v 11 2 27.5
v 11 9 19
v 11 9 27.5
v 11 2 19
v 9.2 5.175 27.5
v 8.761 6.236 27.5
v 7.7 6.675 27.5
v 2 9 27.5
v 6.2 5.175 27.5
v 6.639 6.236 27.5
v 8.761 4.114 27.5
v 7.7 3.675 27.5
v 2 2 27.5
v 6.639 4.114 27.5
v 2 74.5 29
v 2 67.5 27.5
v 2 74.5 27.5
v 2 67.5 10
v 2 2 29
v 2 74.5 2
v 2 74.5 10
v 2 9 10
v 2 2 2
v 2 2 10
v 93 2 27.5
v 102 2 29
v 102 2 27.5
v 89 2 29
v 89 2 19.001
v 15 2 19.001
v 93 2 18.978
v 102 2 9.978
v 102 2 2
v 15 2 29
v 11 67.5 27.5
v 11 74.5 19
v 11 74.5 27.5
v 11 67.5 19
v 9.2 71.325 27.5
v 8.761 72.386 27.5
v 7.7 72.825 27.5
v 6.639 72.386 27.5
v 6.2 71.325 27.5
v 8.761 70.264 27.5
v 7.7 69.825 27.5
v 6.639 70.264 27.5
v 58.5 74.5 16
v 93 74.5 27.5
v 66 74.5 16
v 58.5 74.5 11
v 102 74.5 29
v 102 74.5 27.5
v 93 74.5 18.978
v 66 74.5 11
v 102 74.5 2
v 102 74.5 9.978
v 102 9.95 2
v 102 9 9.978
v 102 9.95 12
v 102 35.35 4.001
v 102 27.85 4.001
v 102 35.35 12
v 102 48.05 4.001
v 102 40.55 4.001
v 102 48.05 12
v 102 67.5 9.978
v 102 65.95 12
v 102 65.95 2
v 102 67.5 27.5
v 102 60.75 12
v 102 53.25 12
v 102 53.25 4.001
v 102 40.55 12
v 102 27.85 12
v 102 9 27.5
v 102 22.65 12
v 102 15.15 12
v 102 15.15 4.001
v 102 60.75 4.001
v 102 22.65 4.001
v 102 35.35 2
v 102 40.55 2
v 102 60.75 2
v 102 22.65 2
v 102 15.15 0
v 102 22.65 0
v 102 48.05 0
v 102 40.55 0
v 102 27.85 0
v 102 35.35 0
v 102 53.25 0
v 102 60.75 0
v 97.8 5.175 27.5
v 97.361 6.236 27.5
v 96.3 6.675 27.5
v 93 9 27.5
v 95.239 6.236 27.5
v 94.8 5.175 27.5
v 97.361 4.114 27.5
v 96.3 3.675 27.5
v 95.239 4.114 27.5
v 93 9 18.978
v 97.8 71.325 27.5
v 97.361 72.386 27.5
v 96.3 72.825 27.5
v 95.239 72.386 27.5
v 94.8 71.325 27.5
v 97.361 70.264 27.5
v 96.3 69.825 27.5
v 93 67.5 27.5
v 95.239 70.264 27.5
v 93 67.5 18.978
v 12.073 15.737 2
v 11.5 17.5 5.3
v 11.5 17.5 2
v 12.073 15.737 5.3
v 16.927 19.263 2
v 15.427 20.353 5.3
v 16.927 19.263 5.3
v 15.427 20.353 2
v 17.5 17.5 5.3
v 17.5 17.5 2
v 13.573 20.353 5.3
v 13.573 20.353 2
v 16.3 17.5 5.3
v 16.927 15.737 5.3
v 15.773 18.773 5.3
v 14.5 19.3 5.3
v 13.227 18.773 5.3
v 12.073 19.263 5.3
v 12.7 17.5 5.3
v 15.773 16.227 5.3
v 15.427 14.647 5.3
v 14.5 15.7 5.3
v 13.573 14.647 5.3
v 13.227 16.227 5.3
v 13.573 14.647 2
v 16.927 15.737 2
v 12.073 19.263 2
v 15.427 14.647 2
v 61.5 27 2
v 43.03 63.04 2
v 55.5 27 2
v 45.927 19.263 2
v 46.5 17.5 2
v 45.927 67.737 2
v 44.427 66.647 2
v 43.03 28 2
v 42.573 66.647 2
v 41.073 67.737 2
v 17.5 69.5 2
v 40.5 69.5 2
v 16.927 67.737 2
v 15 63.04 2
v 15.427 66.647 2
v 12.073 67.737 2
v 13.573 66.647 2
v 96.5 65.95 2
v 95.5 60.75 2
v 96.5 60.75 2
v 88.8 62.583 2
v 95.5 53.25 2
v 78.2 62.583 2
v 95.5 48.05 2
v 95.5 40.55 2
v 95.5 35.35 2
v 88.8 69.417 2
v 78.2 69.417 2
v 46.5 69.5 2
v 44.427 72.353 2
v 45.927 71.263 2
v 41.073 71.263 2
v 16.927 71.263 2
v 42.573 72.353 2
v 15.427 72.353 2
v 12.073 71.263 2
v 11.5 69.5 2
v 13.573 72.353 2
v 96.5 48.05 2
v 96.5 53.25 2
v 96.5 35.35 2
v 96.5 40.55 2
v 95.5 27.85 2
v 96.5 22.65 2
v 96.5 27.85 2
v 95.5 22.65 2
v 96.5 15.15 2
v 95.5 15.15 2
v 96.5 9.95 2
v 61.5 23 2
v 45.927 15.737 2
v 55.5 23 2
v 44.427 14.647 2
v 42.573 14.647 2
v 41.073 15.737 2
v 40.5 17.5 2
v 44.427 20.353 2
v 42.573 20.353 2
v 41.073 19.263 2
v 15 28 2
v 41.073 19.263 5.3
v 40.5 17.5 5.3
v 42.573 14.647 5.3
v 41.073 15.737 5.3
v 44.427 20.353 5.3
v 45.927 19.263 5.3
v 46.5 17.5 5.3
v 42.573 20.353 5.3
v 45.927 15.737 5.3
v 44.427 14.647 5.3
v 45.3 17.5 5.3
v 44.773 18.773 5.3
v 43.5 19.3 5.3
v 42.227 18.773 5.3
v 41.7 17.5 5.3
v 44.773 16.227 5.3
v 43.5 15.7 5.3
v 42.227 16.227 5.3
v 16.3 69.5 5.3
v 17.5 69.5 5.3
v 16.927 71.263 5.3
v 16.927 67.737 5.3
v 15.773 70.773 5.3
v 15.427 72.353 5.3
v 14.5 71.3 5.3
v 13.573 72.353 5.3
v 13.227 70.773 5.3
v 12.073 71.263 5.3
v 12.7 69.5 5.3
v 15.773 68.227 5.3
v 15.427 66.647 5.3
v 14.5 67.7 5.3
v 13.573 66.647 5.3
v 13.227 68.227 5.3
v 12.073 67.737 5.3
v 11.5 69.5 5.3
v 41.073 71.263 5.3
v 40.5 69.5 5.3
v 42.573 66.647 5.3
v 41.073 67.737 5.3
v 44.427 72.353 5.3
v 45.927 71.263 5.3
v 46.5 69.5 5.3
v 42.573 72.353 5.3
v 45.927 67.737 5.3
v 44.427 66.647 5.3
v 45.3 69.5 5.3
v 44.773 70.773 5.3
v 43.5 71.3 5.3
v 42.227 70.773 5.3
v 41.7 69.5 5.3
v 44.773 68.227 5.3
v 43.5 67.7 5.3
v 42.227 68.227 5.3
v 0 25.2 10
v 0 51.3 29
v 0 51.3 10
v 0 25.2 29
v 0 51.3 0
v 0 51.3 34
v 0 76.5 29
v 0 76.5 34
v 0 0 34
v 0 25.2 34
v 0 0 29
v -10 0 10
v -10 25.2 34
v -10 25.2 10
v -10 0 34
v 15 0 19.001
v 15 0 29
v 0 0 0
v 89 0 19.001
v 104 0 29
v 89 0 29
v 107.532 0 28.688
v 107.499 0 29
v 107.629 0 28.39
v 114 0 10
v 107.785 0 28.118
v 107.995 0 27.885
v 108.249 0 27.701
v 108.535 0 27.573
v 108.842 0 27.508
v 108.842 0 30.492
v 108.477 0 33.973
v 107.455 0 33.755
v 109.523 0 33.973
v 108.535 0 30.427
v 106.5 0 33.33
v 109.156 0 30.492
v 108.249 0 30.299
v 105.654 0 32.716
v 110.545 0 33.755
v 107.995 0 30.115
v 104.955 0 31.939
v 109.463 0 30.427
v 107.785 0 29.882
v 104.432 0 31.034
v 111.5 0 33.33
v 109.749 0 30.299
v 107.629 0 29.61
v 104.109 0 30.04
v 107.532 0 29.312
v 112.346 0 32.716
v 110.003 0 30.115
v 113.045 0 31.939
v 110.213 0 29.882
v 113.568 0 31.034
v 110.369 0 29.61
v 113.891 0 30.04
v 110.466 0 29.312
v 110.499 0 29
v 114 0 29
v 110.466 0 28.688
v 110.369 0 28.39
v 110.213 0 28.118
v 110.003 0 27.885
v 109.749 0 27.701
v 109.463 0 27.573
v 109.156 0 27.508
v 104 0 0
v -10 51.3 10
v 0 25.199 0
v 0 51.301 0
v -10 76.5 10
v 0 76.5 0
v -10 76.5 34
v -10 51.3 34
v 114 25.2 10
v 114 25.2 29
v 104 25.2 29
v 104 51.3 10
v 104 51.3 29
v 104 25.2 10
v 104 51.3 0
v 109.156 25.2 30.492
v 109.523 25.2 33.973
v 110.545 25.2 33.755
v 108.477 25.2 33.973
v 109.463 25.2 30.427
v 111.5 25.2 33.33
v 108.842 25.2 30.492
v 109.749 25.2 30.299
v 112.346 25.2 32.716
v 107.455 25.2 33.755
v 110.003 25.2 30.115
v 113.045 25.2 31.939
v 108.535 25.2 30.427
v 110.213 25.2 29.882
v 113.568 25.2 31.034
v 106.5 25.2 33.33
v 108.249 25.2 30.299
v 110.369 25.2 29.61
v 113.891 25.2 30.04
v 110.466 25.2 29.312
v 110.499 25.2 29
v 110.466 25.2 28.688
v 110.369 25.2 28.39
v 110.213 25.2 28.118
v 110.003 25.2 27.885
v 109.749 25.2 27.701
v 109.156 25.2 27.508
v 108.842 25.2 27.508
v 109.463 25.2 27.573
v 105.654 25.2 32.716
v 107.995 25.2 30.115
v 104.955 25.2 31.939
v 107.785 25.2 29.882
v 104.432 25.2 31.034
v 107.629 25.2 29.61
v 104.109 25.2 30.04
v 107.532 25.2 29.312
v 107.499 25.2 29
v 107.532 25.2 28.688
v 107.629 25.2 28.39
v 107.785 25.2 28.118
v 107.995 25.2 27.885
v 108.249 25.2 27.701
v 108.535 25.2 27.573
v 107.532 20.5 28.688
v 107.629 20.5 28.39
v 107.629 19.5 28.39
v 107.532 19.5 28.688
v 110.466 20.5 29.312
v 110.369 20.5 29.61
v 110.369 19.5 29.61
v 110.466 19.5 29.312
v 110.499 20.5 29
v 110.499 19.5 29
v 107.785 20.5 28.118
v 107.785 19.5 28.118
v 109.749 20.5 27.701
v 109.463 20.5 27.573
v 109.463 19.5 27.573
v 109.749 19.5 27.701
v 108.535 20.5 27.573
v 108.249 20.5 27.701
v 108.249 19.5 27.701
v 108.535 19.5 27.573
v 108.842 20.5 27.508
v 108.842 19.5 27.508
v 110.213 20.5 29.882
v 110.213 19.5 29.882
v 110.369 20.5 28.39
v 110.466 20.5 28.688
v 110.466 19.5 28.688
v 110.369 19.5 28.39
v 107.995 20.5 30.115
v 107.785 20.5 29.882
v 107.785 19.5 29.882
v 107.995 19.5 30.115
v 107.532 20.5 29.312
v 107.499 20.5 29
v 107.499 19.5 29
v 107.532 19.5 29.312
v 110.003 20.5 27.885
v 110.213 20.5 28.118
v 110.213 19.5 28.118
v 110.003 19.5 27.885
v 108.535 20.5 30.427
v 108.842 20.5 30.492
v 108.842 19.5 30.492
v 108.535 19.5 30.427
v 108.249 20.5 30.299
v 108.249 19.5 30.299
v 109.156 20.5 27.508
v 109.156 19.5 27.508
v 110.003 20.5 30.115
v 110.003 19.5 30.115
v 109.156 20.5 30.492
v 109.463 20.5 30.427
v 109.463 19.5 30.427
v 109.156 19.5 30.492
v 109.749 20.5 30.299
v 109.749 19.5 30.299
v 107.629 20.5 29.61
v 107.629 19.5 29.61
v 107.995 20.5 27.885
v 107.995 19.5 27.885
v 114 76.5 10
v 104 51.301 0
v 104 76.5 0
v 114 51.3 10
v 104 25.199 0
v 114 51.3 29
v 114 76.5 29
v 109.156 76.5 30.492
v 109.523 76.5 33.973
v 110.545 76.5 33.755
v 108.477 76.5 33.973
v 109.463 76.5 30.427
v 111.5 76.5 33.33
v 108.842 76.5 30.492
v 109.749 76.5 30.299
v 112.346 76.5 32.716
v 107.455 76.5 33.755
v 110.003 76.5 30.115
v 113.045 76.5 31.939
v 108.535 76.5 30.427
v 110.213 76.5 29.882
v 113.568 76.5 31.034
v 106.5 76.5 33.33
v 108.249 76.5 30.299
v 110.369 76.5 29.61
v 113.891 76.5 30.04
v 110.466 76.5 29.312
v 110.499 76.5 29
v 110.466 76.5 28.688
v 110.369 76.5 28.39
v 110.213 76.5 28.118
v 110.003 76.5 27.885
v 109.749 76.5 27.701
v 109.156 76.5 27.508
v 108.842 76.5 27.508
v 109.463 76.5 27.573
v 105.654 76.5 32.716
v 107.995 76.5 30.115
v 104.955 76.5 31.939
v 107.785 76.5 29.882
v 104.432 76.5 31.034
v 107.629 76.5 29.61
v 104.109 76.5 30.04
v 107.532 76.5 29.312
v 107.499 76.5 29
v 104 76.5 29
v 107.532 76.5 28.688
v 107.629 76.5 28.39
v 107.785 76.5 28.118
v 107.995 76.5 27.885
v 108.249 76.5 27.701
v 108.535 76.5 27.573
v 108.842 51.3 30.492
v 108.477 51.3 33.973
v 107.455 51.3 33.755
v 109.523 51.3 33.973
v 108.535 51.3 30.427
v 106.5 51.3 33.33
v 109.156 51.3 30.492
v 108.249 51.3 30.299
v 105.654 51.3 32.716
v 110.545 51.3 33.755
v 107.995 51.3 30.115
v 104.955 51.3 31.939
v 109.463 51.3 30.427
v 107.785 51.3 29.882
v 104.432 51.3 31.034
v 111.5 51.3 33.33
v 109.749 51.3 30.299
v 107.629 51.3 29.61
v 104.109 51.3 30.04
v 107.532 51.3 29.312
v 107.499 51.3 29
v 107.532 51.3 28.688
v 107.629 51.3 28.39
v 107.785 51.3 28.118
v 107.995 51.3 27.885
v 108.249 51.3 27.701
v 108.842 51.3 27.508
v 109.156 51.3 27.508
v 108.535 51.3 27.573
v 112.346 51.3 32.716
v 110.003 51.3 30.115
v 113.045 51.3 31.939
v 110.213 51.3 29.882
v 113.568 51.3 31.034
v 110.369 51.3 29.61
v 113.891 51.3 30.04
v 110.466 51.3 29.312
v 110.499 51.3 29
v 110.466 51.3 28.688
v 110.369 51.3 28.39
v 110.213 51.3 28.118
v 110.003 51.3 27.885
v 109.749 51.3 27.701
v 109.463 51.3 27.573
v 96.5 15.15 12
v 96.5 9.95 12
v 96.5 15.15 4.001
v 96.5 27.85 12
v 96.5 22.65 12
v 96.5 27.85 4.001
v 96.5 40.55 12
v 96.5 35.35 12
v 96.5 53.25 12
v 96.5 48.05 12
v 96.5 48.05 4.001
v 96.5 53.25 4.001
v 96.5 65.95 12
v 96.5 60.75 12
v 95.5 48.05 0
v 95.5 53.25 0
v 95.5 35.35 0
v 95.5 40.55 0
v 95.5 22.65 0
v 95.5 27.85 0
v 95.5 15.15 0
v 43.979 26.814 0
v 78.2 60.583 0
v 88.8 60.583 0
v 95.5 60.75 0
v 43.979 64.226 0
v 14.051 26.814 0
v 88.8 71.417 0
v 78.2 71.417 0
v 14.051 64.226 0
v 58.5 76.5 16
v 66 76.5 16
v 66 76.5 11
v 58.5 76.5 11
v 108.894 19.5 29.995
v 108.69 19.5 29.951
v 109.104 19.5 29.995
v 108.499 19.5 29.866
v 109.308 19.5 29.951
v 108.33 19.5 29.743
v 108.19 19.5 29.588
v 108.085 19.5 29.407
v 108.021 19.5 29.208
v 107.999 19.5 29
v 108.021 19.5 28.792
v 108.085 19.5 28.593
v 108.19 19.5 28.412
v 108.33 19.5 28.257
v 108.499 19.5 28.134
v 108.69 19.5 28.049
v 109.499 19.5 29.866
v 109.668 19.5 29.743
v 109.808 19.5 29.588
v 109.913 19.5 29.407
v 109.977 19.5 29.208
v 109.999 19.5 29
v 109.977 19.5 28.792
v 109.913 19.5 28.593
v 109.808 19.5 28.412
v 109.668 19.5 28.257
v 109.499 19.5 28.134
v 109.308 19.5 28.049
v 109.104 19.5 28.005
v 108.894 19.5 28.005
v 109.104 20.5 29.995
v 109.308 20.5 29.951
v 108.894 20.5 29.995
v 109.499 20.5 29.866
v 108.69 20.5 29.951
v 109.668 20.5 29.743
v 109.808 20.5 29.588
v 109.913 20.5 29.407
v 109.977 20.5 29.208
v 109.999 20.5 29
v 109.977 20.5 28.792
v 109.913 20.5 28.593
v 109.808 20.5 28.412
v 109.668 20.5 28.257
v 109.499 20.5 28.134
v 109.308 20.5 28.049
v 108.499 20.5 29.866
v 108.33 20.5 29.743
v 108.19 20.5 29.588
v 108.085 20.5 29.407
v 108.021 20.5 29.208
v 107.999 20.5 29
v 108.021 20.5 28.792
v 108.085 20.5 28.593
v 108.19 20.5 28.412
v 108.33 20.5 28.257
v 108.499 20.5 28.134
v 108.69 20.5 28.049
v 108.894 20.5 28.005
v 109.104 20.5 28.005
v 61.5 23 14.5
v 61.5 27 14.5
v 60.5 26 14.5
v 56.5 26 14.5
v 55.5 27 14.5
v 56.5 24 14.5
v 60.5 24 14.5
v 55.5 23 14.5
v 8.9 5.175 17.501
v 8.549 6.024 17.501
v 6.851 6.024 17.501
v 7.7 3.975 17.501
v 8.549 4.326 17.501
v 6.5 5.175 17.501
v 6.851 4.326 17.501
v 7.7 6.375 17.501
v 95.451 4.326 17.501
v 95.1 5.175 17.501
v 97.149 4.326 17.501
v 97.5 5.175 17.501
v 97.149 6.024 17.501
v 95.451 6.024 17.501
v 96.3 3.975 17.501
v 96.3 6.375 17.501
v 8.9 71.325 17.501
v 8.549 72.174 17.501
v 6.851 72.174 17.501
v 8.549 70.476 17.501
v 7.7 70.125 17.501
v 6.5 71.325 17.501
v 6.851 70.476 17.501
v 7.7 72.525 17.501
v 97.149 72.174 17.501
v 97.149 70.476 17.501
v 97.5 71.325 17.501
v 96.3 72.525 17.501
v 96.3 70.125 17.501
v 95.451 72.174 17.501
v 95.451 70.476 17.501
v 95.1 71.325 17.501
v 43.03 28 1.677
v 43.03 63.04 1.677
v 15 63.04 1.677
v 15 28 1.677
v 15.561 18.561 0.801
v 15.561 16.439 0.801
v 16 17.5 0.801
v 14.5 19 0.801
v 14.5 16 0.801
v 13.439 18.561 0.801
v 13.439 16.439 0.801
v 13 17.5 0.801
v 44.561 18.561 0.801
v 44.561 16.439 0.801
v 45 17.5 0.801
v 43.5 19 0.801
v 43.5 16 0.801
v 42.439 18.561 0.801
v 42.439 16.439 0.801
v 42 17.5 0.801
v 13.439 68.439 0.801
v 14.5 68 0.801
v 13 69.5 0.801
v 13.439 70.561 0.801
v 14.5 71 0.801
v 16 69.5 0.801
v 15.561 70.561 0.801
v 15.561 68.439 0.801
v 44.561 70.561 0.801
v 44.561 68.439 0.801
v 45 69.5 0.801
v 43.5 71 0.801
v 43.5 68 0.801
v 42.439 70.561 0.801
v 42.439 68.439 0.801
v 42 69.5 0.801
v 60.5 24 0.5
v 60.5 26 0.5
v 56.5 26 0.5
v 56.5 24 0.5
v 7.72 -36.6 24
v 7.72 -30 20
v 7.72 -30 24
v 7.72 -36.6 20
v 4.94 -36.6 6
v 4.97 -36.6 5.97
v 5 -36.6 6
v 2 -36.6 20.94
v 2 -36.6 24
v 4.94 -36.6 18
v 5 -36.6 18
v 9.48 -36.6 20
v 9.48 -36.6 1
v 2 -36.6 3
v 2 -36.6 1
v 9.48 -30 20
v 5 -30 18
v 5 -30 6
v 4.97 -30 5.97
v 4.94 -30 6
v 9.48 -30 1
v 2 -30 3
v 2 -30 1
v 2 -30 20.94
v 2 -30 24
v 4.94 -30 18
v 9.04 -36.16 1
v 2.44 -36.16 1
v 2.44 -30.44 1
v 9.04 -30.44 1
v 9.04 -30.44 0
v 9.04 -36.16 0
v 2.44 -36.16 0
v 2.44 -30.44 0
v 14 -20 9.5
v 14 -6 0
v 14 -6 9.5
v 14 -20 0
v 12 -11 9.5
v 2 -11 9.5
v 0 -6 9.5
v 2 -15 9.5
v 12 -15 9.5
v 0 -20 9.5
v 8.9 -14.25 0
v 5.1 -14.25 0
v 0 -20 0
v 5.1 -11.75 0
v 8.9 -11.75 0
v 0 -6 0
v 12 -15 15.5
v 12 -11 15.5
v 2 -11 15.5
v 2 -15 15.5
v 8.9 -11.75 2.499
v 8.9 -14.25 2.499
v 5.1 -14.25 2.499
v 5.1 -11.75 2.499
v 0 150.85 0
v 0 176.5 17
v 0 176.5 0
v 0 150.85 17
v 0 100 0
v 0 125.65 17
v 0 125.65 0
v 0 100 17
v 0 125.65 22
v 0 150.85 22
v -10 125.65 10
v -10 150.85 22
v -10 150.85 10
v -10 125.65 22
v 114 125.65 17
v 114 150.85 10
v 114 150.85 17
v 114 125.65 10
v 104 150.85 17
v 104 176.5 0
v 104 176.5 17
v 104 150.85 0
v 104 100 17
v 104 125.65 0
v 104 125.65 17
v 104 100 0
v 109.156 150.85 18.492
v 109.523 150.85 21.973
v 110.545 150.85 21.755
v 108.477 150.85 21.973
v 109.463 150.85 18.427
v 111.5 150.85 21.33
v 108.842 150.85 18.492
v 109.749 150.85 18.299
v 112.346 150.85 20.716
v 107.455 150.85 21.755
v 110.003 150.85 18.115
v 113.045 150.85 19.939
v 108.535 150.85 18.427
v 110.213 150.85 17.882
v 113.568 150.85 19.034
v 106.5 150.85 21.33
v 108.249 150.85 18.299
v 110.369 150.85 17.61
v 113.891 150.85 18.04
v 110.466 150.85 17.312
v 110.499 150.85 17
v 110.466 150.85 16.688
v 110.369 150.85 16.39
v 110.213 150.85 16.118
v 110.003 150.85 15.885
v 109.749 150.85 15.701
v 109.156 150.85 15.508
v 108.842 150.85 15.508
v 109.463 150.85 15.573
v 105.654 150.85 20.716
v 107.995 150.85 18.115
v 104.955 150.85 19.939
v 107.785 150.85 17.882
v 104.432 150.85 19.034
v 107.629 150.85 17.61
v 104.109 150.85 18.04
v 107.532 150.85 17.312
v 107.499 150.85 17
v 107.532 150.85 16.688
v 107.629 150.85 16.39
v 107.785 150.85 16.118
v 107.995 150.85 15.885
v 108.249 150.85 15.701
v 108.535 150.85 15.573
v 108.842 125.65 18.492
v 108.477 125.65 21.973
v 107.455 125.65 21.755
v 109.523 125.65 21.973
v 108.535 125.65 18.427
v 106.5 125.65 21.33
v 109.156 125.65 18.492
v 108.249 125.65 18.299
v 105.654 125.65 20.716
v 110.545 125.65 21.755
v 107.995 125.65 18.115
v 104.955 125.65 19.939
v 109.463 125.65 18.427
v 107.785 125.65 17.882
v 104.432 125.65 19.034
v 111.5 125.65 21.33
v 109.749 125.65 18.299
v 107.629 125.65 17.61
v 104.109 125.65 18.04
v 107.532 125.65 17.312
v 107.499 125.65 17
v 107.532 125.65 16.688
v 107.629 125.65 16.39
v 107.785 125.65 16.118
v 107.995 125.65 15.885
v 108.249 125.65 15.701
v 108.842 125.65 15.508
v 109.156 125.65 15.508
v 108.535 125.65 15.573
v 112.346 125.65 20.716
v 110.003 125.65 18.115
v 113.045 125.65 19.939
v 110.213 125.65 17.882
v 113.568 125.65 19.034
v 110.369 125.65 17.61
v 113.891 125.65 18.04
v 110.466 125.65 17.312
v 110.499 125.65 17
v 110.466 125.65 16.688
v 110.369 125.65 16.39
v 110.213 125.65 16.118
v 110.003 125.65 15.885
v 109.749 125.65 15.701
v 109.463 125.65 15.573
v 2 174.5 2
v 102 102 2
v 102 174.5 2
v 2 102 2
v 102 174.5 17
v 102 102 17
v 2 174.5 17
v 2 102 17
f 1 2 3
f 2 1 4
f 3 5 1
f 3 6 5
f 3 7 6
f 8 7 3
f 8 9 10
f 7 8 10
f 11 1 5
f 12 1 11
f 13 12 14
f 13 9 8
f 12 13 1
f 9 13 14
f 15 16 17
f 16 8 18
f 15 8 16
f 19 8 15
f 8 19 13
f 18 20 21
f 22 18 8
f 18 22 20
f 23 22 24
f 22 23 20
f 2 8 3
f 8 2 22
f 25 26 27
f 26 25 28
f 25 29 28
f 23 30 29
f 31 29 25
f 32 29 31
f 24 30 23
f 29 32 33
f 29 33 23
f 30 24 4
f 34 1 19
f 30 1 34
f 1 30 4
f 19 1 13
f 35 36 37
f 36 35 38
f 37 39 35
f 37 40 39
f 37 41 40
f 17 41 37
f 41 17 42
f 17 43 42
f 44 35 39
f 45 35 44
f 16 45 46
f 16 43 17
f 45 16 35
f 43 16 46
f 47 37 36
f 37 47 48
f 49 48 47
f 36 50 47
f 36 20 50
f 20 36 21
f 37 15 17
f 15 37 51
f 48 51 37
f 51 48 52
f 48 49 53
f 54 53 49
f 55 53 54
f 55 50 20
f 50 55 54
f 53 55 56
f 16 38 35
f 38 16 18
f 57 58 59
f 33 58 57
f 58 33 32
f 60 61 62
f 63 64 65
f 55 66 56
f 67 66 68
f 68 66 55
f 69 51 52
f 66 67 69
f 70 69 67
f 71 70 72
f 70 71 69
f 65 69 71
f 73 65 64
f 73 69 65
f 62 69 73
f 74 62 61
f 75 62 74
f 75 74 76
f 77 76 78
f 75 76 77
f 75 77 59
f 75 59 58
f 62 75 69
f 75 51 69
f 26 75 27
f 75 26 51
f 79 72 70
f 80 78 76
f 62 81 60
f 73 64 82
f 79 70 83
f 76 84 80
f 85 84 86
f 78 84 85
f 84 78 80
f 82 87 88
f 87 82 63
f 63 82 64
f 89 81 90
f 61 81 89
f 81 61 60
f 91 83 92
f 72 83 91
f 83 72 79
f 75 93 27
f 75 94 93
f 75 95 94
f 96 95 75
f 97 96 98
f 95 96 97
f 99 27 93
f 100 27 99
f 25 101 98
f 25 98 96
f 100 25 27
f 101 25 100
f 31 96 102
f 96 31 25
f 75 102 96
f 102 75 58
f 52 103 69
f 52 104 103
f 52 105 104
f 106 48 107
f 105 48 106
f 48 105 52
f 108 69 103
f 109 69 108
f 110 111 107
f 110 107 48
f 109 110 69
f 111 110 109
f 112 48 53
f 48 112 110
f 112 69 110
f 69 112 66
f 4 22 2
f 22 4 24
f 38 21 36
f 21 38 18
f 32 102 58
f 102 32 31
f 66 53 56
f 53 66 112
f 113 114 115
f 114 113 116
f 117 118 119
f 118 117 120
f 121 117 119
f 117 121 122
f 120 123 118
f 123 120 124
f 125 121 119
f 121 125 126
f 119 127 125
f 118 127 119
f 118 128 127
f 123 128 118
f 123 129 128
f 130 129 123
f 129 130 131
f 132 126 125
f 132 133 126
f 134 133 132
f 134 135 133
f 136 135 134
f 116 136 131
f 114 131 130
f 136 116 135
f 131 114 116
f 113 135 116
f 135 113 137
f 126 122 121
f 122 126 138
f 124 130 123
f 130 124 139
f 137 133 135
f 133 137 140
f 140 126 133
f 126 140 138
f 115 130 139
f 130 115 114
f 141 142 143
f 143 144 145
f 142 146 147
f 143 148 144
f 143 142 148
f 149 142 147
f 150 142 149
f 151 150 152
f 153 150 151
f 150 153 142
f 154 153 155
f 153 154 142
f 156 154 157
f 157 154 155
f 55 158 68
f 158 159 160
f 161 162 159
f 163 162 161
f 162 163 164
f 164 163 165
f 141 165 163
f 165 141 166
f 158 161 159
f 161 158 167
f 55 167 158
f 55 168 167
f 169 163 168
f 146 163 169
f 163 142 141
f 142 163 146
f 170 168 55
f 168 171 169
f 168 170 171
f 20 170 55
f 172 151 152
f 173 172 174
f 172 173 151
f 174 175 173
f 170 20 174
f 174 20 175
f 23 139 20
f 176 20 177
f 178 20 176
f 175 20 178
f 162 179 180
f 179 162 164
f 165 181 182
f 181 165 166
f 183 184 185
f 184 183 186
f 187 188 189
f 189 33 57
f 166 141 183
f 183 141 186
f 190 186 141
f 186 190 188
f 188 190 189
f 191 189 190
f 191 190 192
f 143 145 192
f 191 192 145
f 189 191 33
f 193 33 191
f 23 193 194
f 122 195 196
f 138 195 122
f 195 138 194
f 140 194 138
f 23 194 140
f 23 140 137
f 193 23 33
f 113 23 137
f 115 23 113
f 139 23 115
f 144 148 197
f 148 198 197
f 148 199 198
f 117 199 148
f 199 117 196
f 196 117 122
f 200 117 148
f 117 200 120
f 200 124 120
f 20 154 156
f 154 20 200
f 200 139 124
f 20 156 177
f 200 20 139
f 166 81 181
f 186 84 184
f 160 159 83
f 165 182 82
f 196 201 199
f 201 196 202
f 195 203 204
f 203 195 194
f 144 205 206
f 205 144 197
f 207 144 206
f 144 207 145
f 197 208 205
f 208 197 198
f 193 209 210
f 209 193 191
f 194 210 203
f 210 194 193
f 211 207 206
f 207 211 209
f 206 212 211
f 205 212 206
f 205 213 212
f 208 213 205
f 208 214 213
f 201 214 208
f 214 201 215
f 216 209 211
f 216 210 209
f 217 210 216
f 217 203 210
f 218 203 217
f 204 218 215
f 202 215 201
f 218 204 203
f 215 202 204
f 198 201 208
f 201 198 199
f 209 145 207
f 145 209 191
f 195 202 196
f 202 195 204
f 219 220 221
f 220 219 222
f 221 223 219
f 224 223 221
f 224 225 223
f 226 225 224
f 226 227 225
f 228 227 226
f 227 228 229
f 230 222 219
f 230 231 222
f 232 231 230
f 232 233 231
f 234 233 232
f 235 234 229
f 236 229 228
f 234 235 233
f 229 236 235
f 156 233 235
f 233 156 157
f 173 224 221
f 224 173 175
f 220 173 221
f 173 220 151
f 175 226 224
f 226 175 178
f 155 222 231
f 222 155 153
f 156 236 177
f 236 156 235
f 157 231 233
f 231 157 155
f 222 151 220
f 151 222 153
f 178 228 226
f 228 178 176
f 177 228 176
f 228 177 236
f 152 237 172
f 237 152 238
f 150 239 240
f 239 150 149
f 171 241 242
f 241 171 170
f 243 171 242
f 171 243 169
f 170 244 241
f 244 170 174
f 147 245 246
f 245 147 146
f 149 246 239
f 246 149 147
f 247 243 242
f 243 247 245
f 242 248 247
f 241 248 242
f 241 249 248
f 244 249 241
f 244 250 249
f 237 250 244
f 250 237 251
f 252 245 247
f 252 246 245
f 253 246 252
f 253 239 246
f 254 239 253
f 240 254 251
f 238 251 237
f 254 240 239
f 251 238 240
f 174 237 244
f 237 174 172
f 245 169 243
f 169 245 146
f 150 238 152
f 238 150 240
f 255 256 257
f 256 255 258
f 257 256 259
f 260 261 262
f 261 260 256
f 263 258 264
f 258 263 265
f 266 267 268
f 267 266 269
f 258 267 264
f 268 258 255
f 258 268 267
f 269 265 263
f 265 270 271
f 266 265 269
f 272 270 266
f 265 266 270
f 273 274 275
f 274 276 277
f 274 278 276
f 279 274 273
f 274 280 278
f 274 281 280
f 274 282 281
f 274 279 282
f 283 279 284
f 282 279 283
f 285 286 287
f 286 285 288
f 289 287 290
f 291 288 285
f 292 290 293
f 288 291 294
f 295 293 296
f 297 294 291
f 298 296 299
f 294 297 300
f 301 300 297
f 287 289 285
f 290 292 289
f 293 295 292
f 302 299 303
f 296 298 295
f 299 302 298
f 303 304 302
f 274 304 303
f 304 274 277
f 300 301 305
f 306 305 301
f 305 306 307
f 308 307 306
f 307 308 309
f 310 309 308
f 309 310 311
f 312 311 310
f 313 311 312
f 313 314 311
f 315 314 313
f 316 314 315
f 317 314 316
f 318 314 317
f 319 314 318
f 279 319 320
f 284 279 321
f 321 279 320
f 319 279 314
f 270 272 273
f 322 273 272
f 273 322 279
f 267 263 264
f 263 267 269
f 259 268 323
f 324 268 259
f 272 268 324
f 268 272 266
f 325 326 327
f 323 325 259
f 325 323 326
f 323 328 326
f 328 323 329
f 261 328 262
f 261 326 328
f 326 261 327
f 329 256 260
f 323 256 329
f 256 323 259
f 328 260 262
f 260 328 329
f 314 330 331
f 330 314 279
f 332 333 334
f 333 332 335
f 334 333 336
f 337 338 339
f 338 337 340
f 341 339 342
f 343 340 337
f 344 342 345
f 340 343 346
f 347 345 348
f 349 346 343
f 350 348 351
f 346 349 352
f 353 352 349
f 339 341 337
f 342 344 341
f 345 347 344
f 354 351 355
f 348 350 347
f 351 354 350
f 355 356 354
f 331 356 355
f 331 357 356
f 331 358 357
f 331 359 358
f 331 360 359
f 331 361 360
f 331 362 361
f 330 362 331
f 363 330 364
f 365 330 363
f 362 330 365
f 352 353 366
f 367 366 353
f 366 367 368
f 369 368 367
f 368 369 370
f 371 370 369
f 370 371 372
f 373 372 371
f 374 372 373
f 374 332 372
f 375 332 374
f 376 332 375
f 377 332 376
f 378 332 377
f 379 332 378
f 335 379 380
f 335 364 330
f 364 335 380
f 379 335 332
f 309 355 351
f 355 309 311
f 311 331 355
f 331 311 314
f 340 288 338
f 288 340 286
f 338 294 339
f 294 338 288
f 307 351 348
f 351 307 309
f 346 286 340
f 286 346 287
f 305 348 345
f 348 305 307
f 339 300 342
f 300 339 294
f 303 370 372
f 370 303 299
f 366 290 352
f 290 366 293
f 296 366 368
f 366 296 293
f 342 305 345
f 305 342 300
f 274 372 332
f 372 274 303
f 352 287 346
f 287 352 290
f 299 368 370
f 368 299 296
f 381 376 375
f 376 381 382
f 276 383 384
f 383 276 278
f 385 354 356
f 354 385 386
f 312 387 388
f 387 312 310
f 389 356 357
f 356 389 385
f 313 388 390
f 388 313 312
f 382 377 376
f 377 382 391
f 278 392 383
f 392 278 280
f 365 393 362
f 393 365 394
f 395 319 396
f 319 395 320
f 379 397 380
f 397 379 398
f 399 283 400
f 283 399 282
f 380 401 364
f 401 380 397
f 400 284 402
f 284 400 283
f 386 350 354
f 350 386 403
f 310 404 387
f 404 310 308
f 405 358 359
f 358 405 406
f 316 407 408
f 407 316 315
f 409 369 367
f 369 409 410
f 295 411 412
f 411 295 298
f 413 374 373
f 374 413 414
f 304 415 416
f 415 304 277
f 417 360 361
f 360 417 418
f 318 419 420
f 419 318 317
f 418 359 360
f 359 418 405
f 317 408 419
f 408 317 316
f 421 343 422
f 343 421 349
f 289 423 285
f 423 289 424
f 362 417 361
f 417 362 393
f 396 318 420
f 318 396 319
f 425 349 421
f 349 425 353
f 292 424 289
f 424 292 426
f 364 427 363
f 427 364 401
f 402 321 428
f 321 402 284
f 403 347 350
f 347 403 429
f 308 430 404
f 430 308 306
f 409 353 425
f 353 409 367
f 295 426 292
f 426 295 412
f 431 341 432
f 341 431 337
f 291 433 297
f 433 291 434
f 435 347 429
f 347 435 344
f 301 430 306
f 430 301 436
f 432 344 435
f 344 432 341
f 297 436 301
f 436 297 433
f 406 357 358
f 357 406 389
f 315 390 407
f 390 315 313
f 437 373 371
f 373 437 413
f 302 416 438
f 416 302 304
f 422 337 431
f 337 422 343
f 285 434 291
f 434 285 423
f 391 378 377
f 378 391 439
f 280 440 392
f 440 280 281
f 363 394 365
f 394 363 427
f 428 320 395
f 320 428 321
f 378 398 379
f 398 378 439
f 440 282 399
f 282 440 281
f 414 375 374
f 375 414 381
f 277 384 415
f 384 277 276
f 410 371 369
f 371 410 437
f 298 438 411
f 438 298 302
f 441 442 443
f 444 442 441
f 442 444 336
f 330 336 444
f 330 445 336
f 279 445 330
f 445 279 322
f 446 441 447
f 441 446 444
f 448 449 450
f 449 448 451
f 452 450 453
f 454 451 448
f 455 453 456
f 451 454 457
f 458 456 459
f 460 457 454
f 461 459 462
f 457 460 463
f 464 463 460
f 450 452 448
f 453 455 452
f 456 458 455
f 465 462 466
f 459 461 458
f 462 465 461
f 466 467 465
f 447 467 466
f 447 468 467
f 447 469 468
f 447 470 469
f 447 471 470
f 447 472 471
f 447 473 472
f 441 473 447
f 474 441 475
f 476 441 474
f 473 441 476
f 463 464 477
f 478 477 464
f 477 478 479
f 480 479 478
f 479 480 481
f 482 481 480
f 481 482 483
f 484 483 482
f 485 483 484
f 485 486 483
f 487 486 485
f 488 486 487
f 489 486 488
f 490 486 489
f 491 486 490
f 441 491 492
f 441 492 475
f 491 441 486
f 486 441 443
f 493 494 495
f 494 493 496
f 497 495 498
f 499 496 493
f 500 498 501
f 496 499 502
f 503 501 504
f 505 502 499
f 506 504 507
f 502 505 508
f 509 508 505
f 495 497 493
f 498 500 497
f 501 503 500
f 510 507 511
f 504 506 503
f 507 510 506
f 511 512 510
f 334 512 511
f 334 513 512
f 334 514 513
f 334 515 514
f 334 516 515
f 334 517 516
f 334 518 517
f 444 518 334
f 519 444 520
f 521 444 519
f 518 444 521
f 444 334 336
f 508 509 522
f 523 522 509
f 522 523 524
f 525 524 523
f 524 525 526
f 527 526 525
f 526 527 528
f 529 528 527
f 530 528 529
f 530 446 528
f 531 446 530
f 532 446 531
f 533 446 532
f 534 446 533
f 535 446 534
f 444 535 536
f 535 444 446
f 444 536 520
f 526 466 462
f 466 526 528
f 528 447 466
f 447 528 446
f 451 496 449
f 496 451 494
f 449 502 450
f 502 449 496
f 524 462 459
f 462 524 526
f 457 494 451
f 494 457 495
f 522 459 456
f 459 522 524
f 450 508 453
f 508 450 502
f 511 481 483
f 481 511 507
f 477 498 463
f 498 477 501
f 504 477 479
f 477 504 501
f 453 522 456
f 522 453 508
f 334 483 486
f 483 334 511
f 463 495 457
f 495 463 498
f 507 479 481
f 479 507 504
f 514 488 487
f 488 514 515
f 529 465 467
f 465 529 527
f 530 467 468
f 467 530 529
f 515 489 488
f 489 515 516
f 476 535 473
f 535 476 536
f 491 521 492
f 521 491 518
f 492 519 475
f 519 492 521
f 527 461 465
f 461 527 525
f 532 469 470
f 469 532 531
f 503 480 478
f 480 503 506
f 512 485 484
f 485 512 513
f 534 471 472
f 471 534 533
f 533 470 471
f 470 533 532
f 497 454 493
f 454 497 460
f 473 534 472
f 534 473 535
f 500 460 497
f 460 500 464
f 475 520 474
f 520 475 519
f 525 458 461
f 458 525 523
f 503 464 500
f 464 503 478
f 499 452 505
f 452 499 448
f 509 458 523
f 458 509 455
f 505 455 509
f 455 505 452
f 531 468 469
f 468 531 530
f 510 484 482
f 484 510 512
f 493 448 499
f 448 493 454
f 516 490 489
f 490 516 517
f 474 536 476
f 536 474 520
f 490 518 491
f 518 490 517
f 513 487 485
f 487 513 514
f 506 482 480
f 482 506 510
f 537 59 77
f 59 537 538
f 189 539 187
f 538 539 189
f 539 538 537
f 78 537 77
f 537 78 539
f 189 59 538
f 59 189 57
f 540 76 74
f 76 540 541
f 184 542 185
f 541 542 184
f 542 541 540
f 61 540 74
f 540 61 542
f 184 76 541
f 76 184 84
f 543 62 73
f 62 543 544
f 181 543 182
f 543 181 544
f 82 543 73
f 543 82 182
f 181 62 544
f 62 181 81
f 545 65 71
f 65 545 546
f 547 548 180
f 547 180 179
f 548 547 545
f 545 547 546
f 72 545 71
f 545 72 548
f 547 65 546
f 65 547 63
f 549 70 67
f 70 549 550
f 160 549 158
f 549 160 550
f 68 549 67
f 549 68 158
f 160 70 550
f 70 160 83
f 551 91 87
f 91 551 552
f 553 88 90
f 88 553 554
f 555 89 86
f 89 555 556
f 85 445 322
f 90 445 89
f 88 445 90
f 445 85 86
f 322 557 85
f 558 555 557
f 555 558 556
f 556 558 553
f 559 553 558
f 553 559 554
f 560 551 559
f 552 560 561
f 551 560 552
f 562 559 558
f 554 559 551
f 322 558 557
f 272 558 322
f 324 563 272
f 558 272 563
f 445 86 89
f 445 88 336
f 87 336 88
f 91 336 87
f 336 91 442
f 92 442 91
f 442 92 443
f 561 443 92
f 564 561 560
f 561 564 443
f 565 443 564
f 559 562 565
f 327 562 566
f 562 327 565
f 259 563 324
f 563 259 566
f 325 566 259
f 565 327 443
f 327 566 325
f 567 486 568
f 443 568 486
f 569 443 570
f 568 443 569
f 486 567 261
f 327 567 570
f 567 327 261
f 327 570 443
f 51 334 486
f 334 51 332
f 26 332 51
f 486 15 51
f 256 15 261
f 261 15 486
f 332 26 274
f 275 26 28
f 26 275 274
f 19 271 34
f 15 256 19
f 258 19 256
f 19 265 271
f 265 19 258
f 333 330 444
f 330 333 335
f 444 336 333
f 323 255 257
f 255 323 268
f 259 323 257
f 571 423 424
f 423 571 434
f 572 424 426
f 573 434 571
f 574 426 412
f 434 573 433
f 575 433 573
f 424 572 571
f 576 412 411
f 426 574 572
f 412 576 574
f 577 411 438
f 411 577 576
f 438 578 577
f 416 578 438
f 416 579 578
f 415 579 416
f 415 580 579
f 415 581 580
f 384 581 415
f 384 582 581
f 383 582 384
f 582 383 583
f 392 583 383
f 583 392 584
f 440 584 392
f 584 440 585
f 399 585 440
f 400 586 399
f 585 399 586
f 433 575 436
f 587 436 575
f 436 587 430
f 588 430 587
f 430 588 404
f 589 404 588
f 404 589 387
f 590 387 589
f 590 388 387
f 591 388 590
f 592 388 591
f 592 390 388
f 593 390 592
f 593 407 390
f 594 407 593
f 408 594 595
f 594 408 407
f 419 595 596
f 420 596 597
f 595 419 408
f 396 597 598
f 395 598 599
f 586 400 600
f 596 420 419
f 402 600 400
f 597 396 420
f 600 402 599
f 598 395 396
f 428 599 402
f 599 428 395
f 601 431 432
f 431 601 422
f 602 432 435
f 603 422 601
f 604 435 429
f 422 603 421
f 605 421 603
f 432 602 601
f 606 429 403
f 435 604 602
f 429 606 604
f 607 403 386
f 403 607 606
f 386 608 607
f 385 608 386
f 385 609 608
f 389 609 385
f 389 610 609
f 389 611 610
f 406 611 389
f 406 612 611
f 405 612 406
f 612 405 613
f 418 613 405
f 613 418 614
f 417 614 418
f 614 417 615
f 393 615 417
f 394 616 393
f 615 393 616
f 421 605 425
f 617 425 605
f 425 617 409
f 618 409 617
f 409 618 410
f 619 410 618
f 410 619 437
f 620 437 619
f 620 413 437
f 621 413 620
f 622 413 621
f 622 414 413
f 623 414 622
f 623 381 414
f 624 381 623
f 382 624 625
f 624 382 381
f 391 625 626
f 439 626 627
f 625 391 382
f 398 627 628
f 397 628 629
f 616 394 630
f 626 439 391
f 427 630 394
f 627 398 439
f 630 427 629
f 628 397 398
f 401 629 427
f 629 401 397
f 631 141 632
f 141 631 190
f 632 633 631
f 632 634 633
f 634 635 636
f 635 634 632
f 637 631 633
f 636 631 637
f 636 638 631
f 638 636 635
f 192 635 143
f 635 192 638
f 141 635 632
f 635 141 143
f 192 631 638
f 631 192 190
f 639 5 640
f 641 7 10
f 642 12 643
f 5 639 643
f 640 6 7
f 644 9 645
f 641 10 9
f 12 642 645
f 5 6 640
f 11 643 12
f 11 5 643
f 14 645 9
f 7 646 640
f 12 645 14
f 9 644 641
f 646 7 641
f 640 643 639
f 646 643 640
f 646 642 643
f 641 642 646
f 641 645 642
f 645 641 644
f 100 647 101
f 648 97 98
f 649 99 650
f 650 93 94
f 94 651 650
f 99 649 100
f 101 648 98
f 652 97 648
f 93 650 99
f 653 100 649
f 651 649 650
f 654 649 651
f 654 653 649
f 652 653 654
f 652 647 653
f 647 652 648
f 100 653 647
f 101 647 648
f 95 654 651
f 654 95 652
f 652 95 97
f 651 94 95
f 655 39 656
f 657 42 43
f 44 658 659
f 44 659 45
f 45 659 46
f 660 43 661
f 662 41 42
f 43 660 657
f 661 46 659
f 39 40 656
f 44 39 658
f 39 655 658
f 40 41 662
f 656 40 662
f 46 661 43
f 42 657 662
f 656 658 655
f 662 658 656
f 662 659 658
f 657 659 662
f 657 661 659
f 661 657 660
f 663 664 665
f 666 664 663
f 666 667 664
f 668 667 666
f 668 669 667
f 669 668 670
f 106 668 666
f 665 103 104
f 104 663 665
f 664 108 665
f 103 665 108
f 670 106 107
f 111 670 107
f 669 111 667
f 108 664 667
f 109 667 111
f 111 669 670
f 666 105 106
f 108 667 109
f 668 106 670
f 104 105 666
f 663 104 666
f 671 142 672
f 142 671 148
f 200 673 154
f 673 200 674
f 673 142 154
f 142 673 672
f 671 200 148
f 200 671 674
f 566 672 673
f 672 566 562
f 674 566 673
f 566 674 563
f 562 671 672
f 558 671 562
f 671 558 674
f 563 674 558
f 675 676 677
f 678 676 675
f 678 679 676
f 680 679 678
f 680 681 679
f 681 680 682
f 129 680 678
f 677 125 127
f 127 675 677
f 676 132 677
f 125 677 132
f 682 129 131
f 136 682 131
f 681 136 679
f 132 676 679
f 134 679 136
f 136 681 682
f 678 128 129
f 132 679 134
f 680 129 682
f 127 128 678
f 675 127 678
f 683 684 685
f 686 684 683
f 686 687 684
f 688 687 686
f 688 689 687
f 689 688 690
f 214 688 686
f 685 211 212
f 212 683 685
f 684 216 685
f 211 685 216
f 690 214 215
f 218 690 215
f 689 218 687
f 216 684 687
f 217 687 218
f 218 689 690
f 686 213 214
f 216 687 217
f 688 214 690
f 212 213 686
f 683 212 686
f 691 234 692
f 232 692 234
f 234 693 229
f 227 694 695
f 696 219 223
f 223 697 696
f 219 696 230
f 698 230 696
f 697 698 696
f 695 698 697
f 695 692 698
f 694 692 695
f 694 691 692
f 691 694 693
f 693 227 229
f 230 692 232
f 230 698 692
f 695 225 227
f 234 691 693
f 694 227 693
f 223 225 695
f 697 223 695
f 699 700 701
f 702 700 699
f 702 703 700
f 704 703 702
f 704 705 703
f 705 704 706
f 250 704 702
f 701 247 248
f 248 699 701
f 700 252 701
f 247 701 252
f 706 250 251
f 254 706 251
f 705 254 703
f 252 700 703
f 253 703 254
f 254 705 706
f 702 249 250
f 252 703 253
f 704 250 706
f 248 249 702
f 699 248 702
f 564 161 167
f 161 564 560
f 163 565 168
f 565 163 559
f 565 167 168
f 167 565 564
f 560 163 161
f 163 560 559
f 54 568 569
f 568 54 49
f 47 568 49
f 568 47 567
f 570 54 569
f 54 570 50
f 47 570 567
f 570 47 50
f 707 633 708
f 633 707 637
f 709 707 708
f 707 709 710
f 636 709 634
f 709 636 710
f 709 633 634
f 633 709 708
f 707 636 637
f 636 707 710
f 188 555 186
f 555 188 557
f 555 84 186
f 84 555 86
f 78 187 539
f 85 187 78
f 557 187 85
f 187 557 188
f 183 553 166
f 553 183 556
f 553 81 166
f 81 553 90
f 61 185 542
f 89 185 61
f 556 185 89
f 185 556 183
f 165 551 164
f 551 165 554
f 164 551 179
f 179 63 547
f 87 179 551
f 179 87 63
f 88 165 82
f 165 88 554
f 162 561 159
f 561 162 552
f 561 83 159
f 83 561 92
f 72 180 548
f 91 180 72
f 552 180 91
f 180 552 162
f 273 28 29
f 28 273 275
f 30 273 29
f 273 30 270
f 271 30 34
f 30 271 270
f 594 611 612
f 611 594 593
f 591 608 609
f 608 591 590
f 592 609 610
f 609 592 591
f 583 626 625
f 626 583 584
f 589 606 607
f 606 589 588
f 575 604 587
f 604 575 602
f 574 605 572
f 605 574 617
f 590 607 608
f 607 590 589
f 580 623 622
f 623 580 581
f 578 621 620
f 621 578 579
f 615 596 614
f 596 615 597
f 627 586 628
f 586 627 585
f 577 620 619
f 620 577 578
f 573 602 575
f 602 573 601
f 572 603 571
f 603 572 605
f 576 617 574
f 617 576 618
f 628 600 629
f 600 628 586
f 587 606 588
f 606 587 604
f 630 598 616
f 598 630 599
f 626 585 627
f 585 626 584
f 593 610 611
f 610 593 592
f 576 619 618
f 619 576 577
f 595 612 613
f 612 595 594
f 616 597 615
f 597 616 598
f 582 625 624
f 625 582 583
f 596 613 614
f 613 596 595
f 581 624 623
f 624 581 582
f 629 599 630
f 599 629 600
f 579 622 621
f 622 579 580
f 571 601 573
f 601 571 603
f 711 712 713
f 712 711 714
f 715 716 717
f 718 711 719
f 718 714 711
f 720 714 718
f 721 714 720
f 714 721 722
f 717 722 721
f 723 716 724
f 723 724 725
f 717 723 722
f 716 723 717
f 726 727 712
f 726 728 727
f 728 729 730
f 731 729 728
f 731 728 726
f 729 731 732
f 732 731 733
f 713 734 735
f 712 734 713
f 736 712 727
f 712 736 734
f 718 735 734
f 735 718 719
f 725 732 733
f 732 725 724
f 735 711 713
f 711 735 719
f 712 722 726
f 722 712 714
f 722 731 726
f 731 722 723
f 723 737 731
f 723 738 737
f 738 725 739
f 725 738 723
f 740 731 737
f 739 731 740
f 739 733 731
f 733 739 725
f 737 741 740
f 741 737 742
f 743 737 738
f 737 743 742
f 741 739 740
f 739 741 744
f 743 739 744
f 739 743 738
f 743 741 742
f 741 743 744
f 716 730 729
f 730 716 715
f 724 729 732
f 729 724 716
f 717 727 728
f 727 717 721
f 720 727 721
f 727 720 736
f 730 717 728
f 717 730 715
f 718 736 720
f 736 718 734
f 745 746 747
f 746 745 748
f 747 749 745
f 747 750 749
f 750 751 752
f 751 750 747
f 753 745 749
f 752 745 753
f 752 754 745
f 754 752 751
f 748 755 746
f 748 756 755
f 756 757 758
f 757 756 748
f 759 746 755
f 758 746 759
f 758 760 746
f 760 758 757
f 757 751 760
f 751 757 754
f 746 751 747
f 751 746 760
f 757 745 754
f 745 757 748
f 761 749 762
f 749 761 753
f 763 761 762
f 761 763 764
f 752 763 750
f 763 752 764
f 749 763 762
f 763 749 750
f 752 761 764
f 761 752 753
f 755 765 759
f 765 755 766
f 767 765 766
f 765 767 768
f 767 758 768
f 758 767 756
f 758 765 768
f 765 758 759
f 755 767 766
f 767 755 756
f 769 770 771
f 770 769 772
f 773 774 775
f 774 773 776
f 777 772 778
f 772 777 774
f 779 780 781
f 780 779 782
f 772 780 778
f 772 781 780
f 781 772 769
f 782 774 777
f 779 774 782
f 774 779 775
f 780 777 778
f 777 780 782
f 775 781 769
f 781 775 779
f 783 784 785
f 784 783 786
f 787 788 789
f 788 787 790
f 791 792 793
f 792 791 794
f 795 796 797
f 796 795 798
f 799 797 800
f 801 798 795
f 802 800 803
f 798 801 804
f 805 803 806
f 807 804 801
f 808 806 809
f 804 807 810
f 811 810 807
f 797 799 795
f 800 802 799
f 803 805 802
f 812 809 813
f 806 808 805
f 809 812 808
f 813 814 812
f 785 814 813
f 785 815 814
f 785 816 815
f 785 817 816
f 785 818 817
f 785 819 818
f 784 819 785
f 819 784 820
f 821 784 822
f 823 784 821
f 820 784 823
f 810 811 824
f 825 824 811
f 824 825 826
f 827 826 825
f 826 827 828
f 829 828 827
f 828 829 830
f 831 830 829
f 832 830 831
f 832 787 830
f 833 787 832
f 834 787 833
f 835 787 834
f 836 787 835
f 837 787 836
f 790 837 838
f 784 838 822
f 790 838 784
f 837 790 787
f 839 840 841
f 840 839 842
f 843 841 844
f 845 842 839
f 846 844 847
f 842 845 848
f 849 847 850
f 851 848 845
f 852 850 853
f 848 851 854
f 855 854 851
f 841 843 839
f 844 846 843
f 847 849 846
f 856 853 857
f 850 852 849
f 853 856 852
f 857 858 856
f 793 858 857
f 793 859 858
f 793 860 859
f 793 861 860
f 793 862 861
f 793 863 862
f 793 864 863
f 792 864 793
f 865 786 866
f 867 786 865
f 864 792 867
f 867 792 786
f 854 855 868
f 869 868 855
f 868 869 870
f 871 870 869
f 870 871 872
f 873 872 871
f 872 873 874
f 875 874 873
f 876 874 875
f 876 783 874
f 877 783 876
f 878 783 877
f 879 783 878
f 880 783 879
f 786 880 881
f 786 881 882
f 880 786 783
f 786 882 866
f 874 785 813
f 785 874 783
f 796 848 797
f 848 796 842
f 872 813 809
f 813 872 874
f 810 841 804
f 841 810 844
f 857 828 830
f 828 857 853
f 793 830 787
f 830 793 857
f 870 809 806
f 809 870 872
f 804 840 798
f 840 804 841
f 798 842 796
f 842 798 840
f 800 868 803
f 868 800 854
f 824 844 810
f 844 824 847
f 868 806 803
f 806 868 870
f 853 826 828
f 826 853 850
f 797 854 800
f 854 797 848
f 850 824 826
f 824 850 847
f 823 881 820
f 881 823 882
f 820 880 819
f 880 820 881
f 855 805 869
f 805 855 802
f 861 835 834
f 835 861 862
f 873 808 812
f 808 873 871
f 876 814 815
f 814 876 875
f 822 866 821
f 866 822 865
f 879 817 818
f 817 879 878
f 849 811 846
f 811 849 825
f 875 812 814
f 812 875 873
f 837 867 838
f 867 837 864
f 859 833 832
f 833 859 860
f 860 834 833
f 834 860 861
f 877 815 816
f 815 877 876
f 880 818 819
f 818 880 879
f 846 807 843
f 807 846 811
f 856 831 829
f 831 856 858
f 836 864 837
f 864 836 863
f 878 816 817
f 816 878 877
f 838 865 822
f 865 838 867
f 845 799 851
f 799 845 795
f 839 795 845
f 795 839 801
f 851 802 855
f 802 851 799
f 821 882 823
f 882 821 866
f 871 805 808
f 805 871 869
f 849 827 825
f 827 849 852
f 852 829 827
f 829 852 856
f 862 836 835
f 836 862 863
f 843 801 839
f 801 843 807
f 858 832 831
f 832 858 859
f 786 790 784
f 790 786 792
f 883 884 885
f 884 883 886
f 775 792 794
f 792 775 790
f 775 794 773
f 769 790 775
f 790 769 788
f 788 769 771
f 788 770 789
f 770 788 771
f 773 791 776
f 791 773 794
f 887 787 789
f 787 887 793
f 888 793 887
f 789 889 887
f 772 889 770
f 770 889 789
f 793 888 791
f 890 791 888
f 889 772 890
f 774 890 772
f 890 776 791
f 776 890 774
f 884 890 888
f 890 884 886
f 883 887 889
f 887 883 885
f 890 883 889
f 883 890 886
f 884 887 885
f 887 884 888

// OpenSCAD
//
// ktBOX1
//
//


gap1 = 0.001;
gap2 = 0.002;

panel_thick = 2;
front_x = 95+5+panel_thick*2;
front_y = 72+0.5+panel_thick*2;
front_z = 25+panel_thick;
rear_x = front_x;
rear_y = front_y;
rear_z = 13+panel_thick;

hinge_x = 10;
hinge_y = front_y/3-0.3;
hinge_hole = 1.1+0.4;
hook_x = 10;
hook_y = front_y/3-0.3;

board_thick = 1.5;
board_hole_x = 88.6;
board_hole_y = 66.15;

lcd_w = 28.03;
lcd_h = 35.04;
lcd_hole_x = 29;
lcd_hole_y = 52;
lcd_slope = 0.755;
lcd_gap = 3.3;




difference(){
    union(){
        //color( "Blue" ){
        cube( [front_x, front_y, panel_thick] );
        wall_x( 0, 0, 0, front_z );
        wall_x( 0, front_y-panel_thick, 0, front_z );
        wall_y( 0, 0, 0, front_z );
        wall_y( front_x-panel_thick, 0, 0, front_z );
        board_base( 0, 0, 0 );
        
        lcd_base( 15, 28, panel_thick );
        
        hook( -10, 0, 0, front_z );
        hook( -10, front_y-hook_y, 0, front_z );
        hinge( front_x, 0, 0, front_z );
        hinge( front_x, front_y-hinge_y, 0, front_z );
        translate( [front_x, hinge_y, 0] )
        cube( [10, front_y-hinge_y*2, 10] );
        translate( [-10, hinge_y, 0] )
        cube( [10, front_y-hinge_y*2, 10] );
        translate( [front_x+10/2, 20, front_z+panel_thick] )
        rotate( [90, 0, 0] )
        cylinder( 1, 2, 2, center=true, $fn=30 );
        
        translate( [63.5, 0, 0] ){
            translate( [-7-1, front_y-15-37.5-1, panel_thick] )
            cube( [6, 4, 12.5] );
        }
        translate( [front_x, 0, 0] ){
            translate( [-7.5, 0+(12.7-8)/2+7.6, panel_thick] )
            cube( [7.5, 5.2, 10] );
            translate( [-7.5, 12.7+(12.7-8)/2+7.6, panel_thick] )
            cube( [7.5, 5.2, 10] );
            translate( [-7.5, 12.7*2+(12.7-8)/2+7.6, panel_thick] )
            cube( [7.5, 5.2, 10] );
            translate( [-7.5, 12.7*3+(12.7-8)/2+7.6, panel_thick] )
            cube( [7.5, 5.2, 10] );
            translate( [-7.5, 12.7*4+(12.7-8)/2+7.6, panel_thick] )
            cube( [7.5, 5.2, 10] );
        }
        //}
    }
    translate( [30/2, -gap1, front_z+panel_thick-10+gap1] )
    cube( [front_x-30, panel_thick+gap2, 10] );
    
    board_hole( (front_x-board_hole_x)/2, (front_y-board_hole_y)/2, front_z+panel_thick-board_thick);

    lcd_window( 15, 28 );
    lcd_hole( 15, 28, panel_thick );

    translate( [front_x+10, hinge_y-gap1, -10] )
    rotate( [0, -45, 0] )
    cube( [10*sqrt(2), front_y-hinge_y*2+gap2, 10*sqrt(2)] );
    translate( [-10, hinge_y-gap1, -10] )
    rotate( [0, -45, 0] )
    cube( [10*sqrt(2), front_y-hinge_y*2+gap2, 10*sqrt(2)] );
    
    translate( [front_x+10/2-gap1, 20, front_z+panel_thick] )
    rotate( [90, 0, 0] )
    cylinder( 1+gap2, 1, 1, center=true, $fn=30 );
    
    translate( [63.5, 0, 0] ){
        translate( [-1.25, front_y-panel_thick/2+gap1, 13.5] )
        cube( [7.5, panel_thick+gap2*2, 5], center=true );
        translate( [20, front_y-10.5, panel_thick/2] ){
            cube( [10+0.6, 6, panel_thick+gap2*2], center=true );
            translate( [0, 6/2, 0] )
            rotate( [-45, 0, 0] )
            cube( [10+0.6, 6, panel_thick+gap2*2], center=true );
            translate( [0, -6/2, 0] )
            rotate( [45, 0, 0] )
            cube( [10+0.6, 6, panel_thick+gap2*2], center=true );
        }
        translate( [-7, front_y-15-37.5, 0.5] )
        cube( [4, 2, 15] );
    }
    
    translate( [front_x, 12.8, 0] ){
        translate( [-8.5, 0+(12.7-8)/2, -gap1] )
        cube( [6.5, 7.5, panel_thick*2+gap2] );
        translate( [-8.5, 12.7+(12.7-8)/2, -gap1] )
        cube( [6.5, 7.5, panel_thick*2+gap2] );
        translate( [-8.5, 12.7*2+(12.7-8)/2, -gap1] )
        cube( [6.5, 7.5, panel_thick*2+gap2] );
        translate( [-8.5, 12.7*3+(12.7-8)/2, -gap1] )
        cube( [6.5, 7.5, panel_thick*2+gap2] );
    }
    
    /*
    translate( [-20, 0, 0] )
    #cube( [20, front_y, front_z+20] );
    translate( [0, 15, 0] )
    #cube( [9, front_y-30, front_z+20] );
    //translate( [front_x-2, 15, 0] )
    //#cube( [2, front_y-30, front_z+20] );
    translate( [front_x, 0, 0] )
    #cube( [20, front_y, front_z+20] );
    translate( [15, 0, 0] )
    #cube( [front_x-30, 5, front_z+20] );
    translate( [15, 0, 0] )
    #cube( [front_x-75, 13, front_z+20] );
    translate( [15, front_y-2, 0] )
    #cube( [front_x-70, 2.1, front_z+20] );
    translate( [front_x-60, front_y-5, 20] )
    #cube( [30, 5, front_z+20] );
    translate( [front_x-30, front_y-5, 10] )
    #cube( [16, 5, front_z+20] );
    translate( [48, 15, 0] )
    #cube( [7, 55, 5] );
    translate( [55, 30, 0] )
    #cube( [20, 40, 5] );
    translate( [65, 10, 0] )
    #cube( [25, 45, 5] );
    */
}


//translate( [front_x, 22.65, panel_thick] )
//rotate( [-90, 0, 180] )
translate( [0, -30, 20] )
rotate( [90, 0, 0] )
button( 0, 0, 0 );


//translate( [76.5, front_y-15+12.8, panel_thick+9.5] )
//rotate( [180, 0, 0] )
translate( [0, -20, 0] )
sw( 0, 0, 0 );


//translate( [0, front_y, front_z+rear_z+panel_thick*2] ){
//    rotate( [180, 0, 0] ){
translate( [0, 100, 0] ){
    rotate( [0, 0, 0] ){
        difference(){
            union(){
                //color( "Black" ){
                cube( [front_x, front_y, panel_thick] );
                wall_x( 0, 0, 0, rear_z );
                wall_x( 0, front_y-panel_thick, 0, rear_z );
                wall_y( 0, 0, 0, rear_z );
                wall_y( front_x-panel_thick, 0, 0, rear_z );
                
                hook( -10, front_y/2-hook_y/2, 0, rear_z );
                hinge( front_x, front_y/2-hinge_y/2, 0, rear_z );
                //}
            }
        }
    }
}




module wall_x( x, y, z, h ){
    translate( [x, y, z+panel_thick] ){
        cube( [front_x, panel_thick, h] );
    }
}

module wall_y( x, y, z, h ){
    translate( [x, y, z+panel_thick] ){
        cube( [panel_thick, front_y, h] );
    }
}

module board_base( x, y, z=0 ){
    base_x = 9;
    base_y = 7;
    translate( [x, y, z] ){
        difference(){
            union(){
            translate( [panel_thick, panel_thick, panel_thick] )
            cube( [base_x, base_y, front_z-board_thick] );
            translate( [panel_thick, front_y-panel_thick-base_y, panel_thick] )
            cube( [base_x, base_y, front_z-board_thick] );
            translate( [front_x-panel_thick-9, panel_thick, panel_thick] )
            cube( [base_x, base_y, front_z-board_thick] );
            translate( [front_x-panel_thick-9, front_y-panel_thick-base_y, panel_thick] )
            cube( [base_x, base_y, front_z-board_thick] );
            }
            translate( [panel_thick-5, panel_thick-gap1, panel_thick+3] )
            rotate( [0, 45, 0] )
            cube( [base_x+3.5, base_y+gap2, front_z-board_thick] );
            translate( [panel_thick-5, front_y-panel_thick-base_y-gap1, panel_thick+3] )
            rotate( [0, 45, 0] )
            cube( [base_x+3.5, base_y+gap2, front_z-board_thick] );
            translate( [front_x-panel_thick-9+5, panel_thick-gap1, panel_thick-5.7] )
            rotate( [0, -45, 0] )
            cube( [base_x+3.5, base_y+gap2, front_z-board_thick] );
            translate( [front_x-panel_thick-9+5, front_y-panel_thick-base_y-gap1, panel_thick-5.7] )
            rotate( [0, -45, 0] )
            cube( [base_x+3.5, base_y+gap2, front_z-board_thick] );        }
    }
}
module board_hole( x, y, z=0 ){
    hole_height = 10;
    translate( [x, y, z-hole_height+gap1] ){
        translate( [0, 0, 0] )
        cylinder( hole_height, 1.2, 1.5, $fn=8 );
        translate( [board_hole_x, 0, 0] )
        cylinder( hole_height, 1.2, 1.5, $fn=8 );
        translate( [0, board_hole_y, 0] )
        cylinder( hole_height, 1.2, 1.5, $fn=8 );
        translate( [board_hole_x, board_hole_y, 0] )
        cylinder( hole_height, 1.2, 1.5, $fn=8 );
    }
}

module hinge( x, y, z, h ){
    translate( [x, y, z] ){
        difference(){
            union(){
                cube( [hinge_x, hinge_y, h+panel_thick] );
                translate( [hinge_x/2, hinge_y/2, h+panel_thick] )
                rotate( [90, 0, 0] )
                cylinder( hinge_y, hinge_x/2, hinge_x/2, center=true, $fn=30 );
            }
            translate( [hinge_x/2-gap1, hinge_y/2, h+panel_thick] )
            rotate( [90, 0, 0] )
            cylinder( hinge_y+gap2, hinge_hole, hinge_hole, center=true, $fn=30 );
            translate( [0, -gap1, 0] )
            rotate( [0, 45, 0] )
            cube( [hinge_x*sqrt(2), hinge_y+gap2, hinge_x*sqrt(2)] );
        }
    }
}

module hook( x, y, z, h ){
    translate( [x, y, z] ){
        difference(){
            union(){
                cube( [hook_x, hook_y, h+panel_thick] );
                translate( [0, 0, h+panel_thick] )
                cube( [hook_x, hook_y, hook_x/2] );
             }
            translate( [0, -gap1, -hook_x] )
            rotate( [0, -45, 0] )
            cube( [hook_x*sqrt(2), hook_y+gap2, hook_x*sqrt(2)] );
        }
    }
}

module handle( x, y, z, h ){
    translate( [x, y-5, z] ){
        difference(){
            minkowski(){
                cube( [front_x-20, 25, rear_z+panel_thick-1] );
                translate( [10, 0, 0] )
                cylinder( r=10, h=1 );
            }
            translate( [10/2, 10/2, -gap1] )
            minkowski(){
                cube( [front_x-20-10, 25-10, rear_z+panel_thick-1+gap2] );
                translate( [10, 0, 0] )
                cylinder( r=10, h=1 );
            }
            translate( [-5, -10, -gap1] )
            cube( [front_x+10, 15, rear_z+panel_thick+gap2] );
        }
    }
}


module lcd_window( x, y, z=0 ){
    translate( [x, y, z-gap1] )
    cube( [lcd_w, lcd_h, panel_thick+gap1] );
    translate( [x+lcd_w/2, y+lcd_h/2, z-gap1] )
    scale( [lcd_w*lcd_slope, lcd_h*lcd_slope, lcd_h*lcd_slope] )
    rotate( [0, 0, 45] )
    cylinder( 1, 1, 0, $fn=4 );
}
module lcd_base( x, y, z ){
    translate( [x-0.5, y-12+3/2, z] ){
        translate( [0, 0, lcd_gap/2] )
        cylinder( lcd_gap, 3, 3, center=true, $fn=10 );
        translate( [lcd_hole_x, 0, lcd_gap/2] )
        cylinder( lcd_gap, 3, 3, center=true, $fn=10 );
        translate( [0, lcd_hole_y, lcd_gap/2] )
        cylinder( lcd_gap, 3, 3, center=true, $fn=10 );
        translate( [lcd_hole_x, lcd_hole_y, lcd_gap/2] )
        cylinder( lcd_gap, 3, 3, center=true, $fn=10 );
    }
}
module lcd_hole( x, y, z ){
    translate( [x-0.5, y-12+3/2, z-1.2+gap1] ){
        cylinder( 6-1.5, 1.5, 1.8, $fn=8 );
        translate( [lcd_hole_x, 0, 0] )
        cylinder( 6-1.5, 1.5, 1.8, $fn=8 );
        translate( [0, lcd_hole_y, 0] )
        cylinder( 6-1.5, 1.5, 1.8, $fn=8 );
        translate( [lcd_hole_x, lcd_hole_y, 0] )
        cylinder( 6-1.5, 1.5, 1.8, $fn=8 );
    }
}



module sw( x, y, z=0 ){
    translate( [x, y, z] ){
        difference(){
            //color( "Black" )
            union(){
                cube( [14, 14, 9.5] );
                translate( [14/2-10/2, 14/2-4/2, 9.5] )
                cube( [10, 4, panel_thick+4] );
            }
            translate( [14/2-3.8/2, 14/2-2.5/2, 0-gap1] )
            cube( [3.8, 2.5, 2.5] );
        }
    }
}



module button( x, y, z=0 ){
    rate = 0.88;
    translate( [x, y, z] ){
        difference(){
            //color( "Black" )
            union(){
                translate( [panel_thick, 0, 0] )
                cube( [6.5*rate, panel_thick+2, 7.5*rate] );
                translate( [panel_thick, -19, 0] )
                cube( [8.5*rate, 19, 7.5*rate] );
                translate( [panel_thick+((8.5*rate)/2-(7.5*rate)/2), -20, (7.5*rate)/2-(6.5*rate)/2] )
                cube( [7.5*rate, 1, 6.5*rate] );
            }
            translate( [panel_thick, -17, -0.5] )
            rotate( [0, 0, 45] )
            cube( [4.2, 5, 7.5] );
            translate( [panel_thick-gap1, -14, -0.5] )
            cube( [3+gap1, 12, 7.5] );
            translate( [panel_thick, -5, -0.5] )
            rotate( [0, 0, 45] )
            cube( [4.2, 5, 7.5] );
        }
    }
}
